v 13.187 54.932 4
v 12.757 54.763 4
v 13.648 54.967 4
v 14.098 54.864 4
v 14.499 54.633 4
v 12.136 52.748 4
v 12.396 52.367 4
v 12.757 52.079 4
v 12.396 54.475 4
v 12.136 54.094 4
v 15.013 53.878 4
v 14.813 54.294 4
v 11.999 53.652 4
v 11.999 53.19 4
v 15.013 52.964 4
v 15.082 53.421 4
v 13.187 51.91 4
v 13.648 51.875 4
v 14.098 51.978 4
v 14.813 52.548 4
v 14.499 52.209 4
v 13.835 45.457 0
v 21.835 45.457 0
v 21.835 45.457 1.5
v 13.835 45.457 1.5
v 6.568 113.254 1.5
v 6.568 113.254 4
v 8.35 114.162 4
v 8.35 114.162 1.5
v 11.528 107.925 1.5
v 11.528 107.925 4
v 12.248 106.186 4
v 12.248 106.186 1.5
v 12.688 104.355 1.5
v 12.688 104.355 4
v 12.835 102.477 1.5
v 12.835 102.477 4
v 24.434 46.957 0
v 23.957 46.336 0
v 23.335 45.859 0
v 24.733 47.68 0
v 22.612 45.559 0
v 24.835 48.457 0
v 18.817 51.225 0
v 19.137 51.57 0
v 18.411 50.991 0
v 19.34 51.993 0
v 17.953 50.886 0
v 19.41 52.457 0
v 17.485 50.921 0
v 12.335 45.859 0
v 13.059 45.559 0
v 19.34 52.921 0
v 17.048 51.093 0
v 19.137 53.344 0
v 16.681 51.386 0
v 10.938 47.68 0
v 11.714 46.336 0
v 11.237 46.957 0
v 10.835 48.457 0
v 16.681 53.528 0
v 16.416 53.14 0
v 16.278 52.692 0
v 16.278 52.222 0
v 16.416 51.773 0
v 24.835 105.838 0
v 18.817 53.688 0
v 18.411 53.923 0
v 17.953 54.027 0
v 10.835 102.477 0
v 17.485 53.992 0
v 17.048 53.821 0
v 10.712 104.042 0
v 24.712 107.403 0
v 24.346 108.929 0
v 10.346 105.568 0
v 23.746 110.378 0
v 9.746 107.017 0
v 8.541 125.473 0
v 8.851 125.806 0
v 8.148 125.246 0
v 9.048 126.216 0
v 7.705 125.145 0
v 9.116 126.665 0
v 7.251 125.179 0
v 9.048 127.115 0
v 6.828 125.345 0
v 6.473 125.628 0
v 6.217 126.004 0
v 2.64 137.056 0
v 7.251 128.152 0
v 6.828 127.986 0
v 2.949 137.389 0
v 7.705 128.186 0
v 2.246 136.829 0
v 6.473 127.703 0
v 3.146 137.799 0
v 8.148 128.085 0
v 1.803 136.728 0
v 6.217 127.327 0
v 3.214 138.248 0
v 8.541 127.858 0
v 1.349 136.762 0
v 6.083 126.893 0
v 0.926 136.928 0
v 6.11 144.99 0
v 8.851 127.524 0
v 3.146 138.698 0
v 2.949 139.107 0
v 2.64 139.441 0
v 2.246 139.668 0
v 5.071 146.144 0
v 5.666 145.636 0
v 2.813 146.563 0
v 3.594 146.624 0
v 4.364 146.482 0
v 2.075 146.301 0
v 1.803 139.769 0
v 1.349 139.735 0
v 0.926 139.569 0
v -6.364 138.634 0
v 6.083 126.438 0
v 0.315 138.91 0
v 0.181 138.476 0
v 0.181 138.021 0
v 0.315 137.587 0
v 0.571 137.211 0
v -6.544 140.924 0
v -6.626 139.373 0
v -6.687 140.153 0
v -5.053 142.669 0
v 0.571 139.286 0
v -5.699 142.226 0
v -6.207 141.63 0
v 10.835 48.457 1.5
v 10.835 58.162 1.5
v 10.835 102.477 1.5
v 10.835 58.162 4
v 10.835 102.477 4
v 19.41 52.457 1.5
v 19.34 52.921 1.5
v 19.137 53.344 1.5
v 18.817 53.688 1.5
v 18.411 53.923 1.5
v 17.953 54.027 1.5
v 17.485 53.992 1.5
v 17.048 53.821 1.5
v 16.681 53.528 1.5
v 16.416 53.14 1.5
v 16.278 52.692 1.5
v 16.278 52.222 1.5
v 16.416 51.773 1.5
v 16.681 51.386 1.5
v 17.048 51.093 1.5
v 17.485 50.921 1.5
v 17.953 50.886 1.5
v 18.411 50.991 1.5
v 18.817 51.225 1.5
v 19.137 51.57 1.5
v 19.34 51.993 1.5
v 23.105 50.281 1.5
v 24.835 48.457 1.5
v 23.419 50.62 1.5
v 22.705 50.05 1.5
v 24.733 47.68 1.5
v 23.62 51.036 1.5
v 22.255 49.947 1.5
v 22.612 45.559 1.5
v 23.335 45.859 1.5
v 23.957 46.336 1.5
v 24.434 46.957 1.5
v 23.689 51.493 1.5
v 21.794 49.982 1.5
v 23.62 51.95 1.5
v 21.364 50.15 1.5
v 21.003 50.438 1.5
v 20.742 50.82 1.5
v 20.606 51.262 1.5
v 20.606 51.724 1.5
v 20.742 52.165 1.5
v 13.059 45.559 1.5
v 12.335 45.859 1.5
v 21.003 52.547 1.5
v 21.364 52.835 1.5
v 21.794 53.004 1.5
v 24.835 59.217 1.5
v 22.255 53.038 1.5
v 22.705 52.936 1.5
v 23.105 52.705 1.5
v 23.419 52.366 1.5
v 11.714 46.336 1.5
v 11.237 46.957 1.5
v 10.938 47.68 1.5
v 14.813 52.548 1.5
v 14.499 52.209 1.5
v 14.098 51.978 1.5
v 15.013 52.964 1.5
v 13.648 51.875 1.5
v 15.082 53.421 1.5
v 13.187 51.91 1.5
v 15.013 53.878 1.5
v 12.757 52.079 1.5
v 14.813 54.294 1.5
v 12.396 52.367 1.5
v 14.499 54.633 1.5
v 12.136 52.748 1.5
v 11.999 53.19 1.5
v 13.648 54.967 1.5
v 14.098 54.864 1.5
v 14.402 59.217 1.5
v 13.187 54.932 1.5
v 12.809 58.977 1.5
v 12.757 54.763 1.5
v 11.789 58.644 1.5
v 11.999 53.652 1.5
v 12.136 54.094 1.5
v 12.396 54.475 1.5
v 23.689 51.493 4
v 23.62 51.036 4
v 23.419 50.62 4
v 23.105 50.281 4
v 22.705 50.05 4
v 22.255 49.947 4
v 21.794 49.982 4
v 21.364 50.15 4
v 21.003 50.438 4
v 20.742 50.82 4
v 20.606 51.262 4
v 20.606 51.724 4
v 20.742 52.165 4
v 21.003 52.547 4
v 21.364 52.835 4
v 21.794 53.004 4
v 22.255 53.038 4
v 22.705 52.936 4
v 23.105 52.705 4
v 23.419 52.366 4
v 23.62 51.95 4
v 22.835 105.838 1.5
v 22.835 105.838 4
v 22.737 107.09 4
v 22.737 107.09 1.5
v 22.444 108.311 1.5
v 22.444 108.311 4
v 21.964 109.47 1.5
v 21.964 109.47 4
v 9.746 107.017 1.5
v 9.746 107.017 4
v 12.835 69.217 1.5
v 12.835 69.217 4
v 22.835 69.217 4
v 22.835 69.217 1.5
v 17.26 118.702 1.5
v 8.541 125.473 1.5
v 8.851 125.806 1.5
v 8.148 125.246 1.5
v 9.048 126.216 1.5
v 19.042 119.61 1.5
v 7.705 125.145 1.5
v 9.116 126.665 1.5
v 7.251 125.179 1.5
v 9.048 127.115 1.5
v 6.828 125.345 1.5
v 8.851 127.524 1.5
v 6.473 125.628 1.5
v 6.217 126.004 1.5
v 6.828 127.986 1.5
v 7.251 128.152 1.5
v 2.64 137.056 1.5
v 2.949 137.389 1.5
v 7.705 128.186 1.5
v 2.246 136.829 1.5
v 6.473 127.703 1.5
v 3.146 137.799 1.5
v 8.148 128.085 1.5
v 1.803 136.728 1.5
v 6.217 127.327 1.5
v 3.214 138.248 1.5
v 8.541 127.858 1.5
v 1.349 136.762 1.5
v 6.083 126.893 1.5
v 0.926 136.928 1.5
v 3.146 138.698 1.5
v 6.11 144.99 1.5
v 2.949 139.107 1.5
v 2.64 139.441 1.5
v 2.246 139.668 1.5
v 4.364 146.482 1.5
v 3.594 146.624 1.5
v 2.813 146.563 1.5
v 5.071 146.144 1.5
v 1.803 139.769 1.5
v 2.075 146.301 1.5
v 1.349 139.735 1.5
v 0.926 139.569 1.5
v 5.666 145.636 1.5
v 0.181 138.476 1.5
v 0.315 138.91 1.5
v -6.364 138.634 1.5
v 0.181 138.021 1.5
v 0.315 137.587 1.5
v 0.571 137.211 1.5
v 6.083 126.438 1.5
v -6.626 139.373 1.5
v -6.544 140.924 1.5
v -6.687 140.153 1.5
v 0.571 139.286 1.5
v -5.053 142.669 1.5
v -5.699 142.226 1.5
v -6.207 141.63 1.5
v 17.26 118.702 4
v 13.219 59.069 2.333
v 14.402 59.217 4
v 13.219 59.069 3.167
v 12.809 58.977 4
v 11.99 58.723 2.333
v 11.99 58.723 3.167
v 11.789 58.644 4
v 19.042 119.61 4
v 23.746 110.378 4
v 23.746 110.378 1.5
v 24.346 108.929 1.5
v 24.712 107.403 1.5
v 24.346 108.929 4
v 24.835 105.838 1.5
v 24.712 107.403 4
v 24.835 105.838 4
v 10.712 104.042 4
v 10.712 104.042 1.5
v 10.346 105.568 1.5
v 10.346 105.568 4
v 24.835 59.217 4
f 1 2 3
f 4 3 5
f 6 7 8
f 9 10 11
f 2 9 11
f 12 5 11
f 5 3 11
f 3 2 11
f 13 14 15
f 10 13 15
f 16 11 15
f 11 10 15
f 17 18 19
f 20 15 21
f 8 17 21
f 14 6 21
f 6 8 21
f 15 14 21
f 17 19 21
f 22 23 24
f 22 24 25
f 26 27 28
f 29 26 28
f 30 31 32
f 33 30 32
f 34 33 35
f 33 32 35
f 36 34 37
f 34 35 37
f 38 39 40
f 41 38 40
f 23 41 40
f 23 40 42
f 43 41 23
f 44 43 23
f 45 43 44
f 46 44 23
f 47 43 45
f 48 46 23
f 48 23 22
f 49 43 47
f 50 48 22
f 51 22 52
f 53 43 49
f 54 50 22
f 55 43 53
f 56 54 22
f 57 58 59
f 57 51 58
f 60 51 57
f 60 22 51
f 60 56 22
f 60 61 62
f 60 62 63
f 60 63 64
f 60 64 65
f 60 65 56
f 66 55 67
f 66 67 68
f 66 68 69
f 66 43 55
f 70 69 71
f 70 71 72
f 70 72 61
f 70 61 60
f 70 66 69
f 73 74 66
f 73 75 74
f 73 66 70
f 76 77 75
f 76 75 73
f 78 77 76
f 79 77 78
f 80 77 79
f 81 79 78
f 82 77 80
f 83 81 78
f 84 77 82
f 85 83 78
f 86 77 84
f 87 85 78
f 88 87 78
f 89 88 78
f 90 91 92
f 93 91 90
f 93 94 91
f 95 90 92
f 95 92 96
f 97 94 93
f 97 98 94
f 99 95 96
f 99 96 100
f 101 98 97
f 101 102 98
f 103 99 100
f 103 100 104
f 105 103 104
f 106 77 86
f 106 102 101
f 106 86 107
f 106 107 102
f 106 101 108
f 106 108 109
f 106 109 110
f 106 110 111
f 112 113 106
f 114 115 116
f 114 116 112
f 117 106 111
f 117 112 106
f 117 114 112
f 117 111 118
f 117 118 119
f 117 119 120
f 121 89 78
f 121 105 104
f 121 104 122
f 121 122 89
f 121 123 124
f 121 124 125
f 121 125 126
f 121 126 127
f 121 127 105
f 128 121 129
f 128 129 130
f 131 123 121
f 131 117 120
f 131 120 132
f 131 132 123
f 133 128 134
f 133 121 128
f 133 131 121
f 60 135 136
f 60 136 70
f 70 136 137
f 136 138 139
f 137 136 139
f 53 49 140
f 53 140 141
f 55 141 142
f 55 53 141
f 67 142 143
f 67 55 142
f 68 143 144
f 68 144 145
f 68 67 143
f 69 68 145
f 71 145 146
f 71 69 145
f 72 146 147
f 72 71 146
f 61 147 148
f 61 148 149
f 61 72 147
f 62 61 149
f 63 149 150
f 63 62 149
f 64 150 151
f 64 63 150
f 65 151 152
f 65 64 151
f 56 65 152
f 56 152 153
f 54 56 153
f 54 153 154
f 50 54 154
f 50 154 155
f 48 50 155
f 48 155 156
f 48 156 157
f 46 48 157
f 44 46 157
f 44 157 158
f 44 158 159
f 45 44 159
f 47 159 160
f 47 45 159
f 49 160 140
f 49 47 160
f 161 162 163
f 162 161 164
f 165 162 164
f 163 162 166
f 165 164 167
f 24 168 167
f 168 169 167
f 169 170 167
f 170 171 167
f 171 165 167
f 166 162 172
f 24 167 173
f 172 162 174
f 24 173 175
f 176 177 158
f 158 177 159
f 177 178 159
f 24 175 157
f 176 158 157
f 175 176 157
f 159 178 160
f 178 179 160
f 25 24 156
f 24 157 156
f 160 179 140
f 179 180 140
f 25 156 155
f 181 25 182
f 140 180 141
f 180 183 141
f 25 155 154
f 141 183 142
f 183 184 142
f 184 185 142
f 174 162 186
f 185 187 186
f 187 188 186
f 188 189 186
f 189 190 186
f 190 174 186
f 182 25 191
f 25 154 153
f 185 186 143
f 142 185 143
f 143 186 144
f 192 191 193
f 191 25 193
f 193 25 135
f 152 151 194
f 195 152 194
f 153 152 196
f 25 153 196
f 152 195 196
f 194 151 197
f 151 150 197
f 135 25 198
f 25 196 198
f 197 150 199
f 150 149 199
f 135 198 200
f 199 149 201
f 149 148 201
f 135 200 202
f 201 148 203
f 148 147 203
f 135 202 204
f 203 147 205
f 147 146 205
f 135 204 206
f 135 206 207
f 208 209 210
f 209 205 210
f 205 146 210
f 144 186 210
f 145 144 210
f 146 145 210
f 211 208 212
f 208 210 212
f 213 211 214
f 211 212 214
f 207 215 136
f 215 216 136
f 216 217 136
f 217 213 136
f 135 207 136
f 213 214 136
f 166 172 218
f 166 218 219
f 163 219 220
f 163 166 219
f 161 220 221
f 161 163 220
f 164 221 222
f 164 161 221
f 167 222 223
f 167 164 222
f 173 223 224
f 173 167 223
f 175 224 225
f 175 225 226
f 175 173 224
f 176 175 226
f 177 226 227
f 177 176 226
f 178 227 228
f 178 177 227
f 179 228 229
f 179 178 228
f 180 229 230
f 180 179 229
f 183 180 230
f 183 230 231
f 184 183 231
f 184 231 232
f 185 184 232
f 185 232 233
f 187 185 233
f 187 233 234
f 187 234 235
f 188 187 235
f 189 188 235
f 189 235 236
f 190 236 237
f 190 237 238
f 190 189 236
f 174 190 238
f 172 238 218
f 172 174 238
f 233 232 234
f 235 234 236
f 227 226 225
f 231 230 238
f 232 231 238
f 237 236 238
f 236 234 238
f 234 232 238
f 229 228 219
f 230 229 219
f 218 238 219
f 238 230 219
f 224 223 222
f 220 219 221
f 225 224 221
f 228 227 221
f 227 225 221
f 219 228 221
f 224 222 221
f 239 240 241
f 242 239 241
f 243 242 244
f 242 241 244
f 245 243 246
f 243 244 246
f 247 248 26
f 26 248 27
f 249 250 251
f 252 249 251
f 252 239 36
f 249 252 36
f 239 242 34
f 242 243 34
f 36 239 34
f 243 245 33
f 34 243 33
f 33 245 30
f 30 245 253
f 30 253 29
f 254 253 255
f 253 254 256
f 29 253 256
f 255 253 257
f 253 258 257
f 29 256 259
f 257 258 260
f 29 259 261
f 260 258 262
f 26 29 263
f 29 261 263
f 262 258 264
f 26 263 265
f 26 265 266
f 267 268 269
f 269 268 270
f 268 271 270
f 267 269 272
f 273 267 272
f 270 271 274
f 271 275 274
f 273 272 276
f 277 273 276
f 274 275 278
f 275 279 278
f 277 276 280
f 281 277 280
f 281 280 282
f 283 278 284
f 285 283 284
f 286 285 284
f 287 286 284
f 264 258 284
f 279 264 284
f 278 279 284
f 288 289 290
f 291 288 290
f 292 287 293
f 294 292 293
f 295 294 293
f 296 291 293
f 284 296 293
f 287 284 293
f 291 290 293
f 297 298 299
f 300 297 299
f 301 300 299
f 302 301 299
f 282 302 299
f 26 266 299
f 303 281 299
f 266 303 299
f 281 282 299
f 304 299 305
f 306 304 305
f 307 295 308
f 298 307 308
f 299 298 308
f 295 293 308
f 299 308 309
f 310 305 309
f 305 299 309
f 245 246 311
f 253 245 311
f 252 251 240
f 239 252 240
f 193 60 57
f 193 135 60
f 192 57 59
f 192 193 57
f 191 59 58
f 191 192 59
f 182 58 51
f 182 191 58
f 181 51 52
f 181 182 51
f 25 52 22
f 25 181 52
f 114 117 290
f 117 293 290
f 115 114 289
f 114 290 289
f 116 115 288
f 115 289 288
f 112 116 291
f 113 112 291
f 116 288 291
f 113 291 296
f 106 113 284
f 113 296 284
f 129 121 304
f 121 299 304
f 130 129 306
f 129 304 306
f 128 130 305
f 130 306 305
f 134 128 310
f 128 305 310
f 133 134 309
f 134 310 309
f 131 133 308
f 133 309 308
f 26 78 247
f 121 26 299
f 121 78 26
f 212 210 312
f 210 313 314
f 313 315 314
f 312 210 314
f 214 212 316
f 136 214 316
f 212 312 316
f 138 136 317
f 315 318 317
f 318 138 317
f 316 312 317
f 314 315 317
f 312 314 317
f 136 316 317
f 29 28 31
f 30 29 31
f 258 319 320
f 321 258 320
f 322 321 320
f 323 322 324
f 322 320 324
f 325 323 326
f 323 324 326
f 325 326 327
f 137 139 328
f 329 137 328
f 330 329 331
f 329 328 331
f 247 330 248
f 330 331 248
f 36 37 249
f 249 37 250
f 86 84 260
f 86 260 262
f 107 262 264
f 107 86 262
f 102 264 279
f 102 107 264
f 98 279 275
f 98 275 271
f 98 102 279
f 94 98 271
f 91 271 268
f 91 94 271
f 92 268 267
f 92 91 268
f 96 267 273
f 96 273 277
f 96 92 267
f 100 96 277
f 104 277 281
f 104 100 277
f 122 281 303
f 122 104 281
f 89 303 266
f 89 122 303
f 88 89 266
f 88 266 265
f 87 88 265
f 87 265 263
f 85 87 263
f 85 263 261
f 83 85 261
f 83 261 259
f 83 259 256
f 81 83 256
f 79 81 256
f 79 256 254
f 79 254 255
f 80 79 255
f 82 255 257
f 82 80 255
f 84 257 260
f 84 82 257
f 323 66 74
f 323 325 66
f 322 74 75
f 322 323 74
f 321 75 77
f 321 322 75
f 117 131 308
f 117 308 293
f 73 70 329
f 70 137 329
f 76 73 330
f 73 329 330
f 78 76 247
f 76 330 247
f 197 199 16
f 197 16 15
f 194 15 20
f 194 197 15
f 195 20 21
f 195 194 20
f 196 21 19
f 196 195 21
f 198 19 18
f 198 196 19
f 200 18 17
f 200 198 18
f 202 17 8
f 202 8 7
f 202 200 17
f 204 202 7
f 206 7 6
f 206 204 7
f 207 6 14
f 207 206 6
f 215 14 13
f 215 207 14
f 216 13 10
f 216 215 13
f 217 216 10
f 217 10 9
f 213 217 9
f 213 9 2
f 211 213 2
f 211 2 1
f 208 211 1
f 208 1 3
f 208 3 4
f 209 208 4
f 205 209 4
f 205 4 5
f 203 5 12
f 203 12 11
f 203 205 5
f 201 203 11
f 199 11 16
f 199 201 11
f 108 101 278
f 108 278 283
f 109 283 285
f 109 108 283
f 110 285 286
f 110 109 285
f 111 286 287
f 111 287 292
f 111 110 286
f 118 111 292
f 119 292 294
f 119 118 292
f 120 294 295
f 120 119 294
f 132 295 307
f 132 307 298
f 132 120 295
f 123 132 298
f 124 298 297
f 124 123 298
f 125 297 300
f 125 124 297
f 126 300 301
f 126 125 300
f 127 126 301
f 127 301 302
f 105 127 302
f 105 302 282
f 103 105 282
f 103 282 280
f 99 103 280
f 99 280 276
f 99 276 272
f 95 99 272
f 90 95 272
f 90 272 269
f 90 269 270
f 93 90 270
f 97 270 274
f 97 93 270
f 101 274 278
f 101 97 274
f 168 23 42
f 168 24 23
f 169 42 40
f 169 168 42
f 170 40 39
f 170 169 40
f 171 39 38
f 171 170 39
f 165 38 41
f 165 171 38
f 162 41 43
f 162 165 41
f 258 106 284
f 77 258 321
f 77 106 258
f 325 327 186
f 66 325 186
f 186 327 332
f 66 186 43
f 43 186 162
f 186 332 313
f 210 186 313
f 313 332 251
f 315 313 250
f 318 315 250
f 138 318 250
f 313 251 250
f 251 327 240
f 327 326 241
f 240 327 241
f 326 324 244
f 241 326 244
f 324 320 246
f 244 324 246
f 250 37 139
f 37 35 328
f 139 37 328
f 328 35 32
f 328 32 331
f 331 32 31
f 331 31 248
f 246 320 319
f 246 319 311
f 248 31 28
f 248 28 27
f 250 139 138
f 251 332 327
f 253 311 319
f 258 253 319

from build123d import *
from OCP.BRepFilletAPI import BRepFilletAPI_MakeFillet

# Parameters (mm, degrees)
SCHIZZO2_R                   = 1.575
SCHIZZO2_R_2                 = 1.525
ESTRUSIONE_ESTRUSIONE1_DEPTH = 1.5
RACCORDO1_R1                 = 3
RACCORDO1_R2                 = 10
ESTRUSIONE_ESTRUSIONE2_START = -1.5
SCHIZZO4_R                   = 1.55
ESTRUSIONE_ESTRUSIONE2_DEPTH = 2.5
ESTRUSIONE_ESTRUSIONE3_START = 2.5
ESTRUSIONE_ESTRUSIONE3_DEPTH = 2.5


with BuildPart() as part:
    # Schizzo2 → Estrusione-Estrusione1 (new body)
    with BuildSketch(Plane.XY):
        Polygon((10.835450111, 45.456844872), (10.835450111, 104.878132603), (-7.726239407, 141.30749945), (4.747851932, 147.663366447), (24.835450111, 108.23923523), (24.835450111, 45.456844872), align=None)
        with Locations((17.835450111, 52.456844872)):
            Circle(SCHIZZO2_R, mode=Mode.SUBTRACT)
        with Locations((1.688739761, 138.248387279)):
            Circle(SCHIZZO2_R_2, mode=Mode.SUBTRACT)
        with Locations((7.590616257, 126.665302465)):
            Circle(SCHIZZO2_R_2, mode=Mode.SUBTRACT)
    extrude(amount=ESTRUSIONE_ESTRUSIONE1_DEPTH)

    # Raccordo1: one fillet with a radius per group of edges: ONE call of the kernel's fillet builder (fillet() takes one radius for all edges)
    raccordo1_edges_1 = [part.edges().sort_by_distance(p)[0] for p in [
        (4.747851932, 147.663366447, 0.75),
        (-7.726239407, 141.30749945, 0.75),
        (10.835450111, 45.456844872, 0.75),
        (24.835450111, 45.456844872, 0.75),
    ]]
    raccordo1_edges_2 = [part.edges().sort_by_distance(p)[0] for p in [
        (24.835450111, 108.23923523, 0.75),
        (10.835450111, 104.878132603, 0.75),
    ]]
    raccordo1 = BRepFilletAPI_MakeFillet(part.part.solid().wrapped)
    for e in raccordo1_edges_1:
        raccordo1.Add(RACCORDO1_R1, e.wrapped)
    for e in raccordo1_edges_2:
        raccordo1.Add(RACCORDO1_R2, e.wrapped)
    add(Compound.cast(raccordo1.Shape()), mode=Mode.REPLACE)

    # Schizzo4 → Estrusione-Estrusione2 (add)
    with BuildSketch(Plane(origin=(0, 0, 0), x_dir=(-1, 0, 0), z_dir=(0, 0, -1)).offset(ESTRUSIONE_ESTRUSIONE2_START)):
        with Locations(Location((-13.532140626, 53.421016786, 0), (0, 0, 180))):
            Circle(SCHIZZO4_R)
        with Locations(Location((-22.138759596, 51.492672958, 0), (0, 0, 180))):
            Circle(SCHIZZO4_R)
    extrude(amount=-ESTRUSIONE_ESTRUSIONE2_DEPTH)

    # Schizzo5 → Estrusione-Estrusione3 (add)
    with BuildSketch(Plane.XY.offset(1.5).offset(ESTRUSIONE_ESTRUSIONE3_START)):
        with BuildLine():
            Line((24.835450111, 59.217112451), (14.402001203, 59.217112451))
            add(Edge.make_bspline(
                [(14.402001203, 59.217112451), (13.28177849, 59.164141407), (11.913165696, 58.833942628), (10.835450111, 58.162340852)],
                knots=[0, 0, 0, 0, 0.33692331, 0.33692331, 0.33692331, 0.33692331], degree=3))
            Line((10.835450111, 58.162340852), (10.835450111, 102.477345012))
            ThreePointArc((10.835450111, 102.477345012), (10.559149315, 104.811798651), (9.745515353, 107.01725001))
            Line((9.745515353, 107.01725001), (6.567581855, 113.254295679))
            Line((6.567581855, 113.254295679), (8.349594903, 114.162276678))
            Line((8.349594903, 114.162276678), (11.527528401, 107.925231009))
            ThreePointArc((11.527528401, 107.925231009), (12.503889156, 105.278689378), (12.835450111, 102.477345012))
            Line((12.835450111, 102.477345012), (12.835450111, 69.217112451))
            Line((12.835450111, 69.217112451), (22.835450111, 69.217112451))
            Line((22.835450111, 69.217112451), (22.835450111, 105.838447639))
            ThreePointArc((22.835450111, 105.838447639), (22.614409474, 107.70601055), (21.963502304, 109.470371637))
            Line((21.963502304, 109.470371637), (17.259660145, 118.702181676))
            Line((17.259660145, 118.702181676), (19.041673193, 119.610162675))
            Line((19.041673193, 119.610162675), (23.745515353, 110.378352637))
            ThreePointArc((23.745515353, 110.378352637), (24.559149315, 108.172901278), (24.835450111, 105.838447639))
            Line((24.835450111, 105.838447639), (24.835450111, 59.217112451))
        make_face()
    extrude(amount=-ESTRUSIONE_ESTRUSIONE3_DEPTH)


solid = part.part
